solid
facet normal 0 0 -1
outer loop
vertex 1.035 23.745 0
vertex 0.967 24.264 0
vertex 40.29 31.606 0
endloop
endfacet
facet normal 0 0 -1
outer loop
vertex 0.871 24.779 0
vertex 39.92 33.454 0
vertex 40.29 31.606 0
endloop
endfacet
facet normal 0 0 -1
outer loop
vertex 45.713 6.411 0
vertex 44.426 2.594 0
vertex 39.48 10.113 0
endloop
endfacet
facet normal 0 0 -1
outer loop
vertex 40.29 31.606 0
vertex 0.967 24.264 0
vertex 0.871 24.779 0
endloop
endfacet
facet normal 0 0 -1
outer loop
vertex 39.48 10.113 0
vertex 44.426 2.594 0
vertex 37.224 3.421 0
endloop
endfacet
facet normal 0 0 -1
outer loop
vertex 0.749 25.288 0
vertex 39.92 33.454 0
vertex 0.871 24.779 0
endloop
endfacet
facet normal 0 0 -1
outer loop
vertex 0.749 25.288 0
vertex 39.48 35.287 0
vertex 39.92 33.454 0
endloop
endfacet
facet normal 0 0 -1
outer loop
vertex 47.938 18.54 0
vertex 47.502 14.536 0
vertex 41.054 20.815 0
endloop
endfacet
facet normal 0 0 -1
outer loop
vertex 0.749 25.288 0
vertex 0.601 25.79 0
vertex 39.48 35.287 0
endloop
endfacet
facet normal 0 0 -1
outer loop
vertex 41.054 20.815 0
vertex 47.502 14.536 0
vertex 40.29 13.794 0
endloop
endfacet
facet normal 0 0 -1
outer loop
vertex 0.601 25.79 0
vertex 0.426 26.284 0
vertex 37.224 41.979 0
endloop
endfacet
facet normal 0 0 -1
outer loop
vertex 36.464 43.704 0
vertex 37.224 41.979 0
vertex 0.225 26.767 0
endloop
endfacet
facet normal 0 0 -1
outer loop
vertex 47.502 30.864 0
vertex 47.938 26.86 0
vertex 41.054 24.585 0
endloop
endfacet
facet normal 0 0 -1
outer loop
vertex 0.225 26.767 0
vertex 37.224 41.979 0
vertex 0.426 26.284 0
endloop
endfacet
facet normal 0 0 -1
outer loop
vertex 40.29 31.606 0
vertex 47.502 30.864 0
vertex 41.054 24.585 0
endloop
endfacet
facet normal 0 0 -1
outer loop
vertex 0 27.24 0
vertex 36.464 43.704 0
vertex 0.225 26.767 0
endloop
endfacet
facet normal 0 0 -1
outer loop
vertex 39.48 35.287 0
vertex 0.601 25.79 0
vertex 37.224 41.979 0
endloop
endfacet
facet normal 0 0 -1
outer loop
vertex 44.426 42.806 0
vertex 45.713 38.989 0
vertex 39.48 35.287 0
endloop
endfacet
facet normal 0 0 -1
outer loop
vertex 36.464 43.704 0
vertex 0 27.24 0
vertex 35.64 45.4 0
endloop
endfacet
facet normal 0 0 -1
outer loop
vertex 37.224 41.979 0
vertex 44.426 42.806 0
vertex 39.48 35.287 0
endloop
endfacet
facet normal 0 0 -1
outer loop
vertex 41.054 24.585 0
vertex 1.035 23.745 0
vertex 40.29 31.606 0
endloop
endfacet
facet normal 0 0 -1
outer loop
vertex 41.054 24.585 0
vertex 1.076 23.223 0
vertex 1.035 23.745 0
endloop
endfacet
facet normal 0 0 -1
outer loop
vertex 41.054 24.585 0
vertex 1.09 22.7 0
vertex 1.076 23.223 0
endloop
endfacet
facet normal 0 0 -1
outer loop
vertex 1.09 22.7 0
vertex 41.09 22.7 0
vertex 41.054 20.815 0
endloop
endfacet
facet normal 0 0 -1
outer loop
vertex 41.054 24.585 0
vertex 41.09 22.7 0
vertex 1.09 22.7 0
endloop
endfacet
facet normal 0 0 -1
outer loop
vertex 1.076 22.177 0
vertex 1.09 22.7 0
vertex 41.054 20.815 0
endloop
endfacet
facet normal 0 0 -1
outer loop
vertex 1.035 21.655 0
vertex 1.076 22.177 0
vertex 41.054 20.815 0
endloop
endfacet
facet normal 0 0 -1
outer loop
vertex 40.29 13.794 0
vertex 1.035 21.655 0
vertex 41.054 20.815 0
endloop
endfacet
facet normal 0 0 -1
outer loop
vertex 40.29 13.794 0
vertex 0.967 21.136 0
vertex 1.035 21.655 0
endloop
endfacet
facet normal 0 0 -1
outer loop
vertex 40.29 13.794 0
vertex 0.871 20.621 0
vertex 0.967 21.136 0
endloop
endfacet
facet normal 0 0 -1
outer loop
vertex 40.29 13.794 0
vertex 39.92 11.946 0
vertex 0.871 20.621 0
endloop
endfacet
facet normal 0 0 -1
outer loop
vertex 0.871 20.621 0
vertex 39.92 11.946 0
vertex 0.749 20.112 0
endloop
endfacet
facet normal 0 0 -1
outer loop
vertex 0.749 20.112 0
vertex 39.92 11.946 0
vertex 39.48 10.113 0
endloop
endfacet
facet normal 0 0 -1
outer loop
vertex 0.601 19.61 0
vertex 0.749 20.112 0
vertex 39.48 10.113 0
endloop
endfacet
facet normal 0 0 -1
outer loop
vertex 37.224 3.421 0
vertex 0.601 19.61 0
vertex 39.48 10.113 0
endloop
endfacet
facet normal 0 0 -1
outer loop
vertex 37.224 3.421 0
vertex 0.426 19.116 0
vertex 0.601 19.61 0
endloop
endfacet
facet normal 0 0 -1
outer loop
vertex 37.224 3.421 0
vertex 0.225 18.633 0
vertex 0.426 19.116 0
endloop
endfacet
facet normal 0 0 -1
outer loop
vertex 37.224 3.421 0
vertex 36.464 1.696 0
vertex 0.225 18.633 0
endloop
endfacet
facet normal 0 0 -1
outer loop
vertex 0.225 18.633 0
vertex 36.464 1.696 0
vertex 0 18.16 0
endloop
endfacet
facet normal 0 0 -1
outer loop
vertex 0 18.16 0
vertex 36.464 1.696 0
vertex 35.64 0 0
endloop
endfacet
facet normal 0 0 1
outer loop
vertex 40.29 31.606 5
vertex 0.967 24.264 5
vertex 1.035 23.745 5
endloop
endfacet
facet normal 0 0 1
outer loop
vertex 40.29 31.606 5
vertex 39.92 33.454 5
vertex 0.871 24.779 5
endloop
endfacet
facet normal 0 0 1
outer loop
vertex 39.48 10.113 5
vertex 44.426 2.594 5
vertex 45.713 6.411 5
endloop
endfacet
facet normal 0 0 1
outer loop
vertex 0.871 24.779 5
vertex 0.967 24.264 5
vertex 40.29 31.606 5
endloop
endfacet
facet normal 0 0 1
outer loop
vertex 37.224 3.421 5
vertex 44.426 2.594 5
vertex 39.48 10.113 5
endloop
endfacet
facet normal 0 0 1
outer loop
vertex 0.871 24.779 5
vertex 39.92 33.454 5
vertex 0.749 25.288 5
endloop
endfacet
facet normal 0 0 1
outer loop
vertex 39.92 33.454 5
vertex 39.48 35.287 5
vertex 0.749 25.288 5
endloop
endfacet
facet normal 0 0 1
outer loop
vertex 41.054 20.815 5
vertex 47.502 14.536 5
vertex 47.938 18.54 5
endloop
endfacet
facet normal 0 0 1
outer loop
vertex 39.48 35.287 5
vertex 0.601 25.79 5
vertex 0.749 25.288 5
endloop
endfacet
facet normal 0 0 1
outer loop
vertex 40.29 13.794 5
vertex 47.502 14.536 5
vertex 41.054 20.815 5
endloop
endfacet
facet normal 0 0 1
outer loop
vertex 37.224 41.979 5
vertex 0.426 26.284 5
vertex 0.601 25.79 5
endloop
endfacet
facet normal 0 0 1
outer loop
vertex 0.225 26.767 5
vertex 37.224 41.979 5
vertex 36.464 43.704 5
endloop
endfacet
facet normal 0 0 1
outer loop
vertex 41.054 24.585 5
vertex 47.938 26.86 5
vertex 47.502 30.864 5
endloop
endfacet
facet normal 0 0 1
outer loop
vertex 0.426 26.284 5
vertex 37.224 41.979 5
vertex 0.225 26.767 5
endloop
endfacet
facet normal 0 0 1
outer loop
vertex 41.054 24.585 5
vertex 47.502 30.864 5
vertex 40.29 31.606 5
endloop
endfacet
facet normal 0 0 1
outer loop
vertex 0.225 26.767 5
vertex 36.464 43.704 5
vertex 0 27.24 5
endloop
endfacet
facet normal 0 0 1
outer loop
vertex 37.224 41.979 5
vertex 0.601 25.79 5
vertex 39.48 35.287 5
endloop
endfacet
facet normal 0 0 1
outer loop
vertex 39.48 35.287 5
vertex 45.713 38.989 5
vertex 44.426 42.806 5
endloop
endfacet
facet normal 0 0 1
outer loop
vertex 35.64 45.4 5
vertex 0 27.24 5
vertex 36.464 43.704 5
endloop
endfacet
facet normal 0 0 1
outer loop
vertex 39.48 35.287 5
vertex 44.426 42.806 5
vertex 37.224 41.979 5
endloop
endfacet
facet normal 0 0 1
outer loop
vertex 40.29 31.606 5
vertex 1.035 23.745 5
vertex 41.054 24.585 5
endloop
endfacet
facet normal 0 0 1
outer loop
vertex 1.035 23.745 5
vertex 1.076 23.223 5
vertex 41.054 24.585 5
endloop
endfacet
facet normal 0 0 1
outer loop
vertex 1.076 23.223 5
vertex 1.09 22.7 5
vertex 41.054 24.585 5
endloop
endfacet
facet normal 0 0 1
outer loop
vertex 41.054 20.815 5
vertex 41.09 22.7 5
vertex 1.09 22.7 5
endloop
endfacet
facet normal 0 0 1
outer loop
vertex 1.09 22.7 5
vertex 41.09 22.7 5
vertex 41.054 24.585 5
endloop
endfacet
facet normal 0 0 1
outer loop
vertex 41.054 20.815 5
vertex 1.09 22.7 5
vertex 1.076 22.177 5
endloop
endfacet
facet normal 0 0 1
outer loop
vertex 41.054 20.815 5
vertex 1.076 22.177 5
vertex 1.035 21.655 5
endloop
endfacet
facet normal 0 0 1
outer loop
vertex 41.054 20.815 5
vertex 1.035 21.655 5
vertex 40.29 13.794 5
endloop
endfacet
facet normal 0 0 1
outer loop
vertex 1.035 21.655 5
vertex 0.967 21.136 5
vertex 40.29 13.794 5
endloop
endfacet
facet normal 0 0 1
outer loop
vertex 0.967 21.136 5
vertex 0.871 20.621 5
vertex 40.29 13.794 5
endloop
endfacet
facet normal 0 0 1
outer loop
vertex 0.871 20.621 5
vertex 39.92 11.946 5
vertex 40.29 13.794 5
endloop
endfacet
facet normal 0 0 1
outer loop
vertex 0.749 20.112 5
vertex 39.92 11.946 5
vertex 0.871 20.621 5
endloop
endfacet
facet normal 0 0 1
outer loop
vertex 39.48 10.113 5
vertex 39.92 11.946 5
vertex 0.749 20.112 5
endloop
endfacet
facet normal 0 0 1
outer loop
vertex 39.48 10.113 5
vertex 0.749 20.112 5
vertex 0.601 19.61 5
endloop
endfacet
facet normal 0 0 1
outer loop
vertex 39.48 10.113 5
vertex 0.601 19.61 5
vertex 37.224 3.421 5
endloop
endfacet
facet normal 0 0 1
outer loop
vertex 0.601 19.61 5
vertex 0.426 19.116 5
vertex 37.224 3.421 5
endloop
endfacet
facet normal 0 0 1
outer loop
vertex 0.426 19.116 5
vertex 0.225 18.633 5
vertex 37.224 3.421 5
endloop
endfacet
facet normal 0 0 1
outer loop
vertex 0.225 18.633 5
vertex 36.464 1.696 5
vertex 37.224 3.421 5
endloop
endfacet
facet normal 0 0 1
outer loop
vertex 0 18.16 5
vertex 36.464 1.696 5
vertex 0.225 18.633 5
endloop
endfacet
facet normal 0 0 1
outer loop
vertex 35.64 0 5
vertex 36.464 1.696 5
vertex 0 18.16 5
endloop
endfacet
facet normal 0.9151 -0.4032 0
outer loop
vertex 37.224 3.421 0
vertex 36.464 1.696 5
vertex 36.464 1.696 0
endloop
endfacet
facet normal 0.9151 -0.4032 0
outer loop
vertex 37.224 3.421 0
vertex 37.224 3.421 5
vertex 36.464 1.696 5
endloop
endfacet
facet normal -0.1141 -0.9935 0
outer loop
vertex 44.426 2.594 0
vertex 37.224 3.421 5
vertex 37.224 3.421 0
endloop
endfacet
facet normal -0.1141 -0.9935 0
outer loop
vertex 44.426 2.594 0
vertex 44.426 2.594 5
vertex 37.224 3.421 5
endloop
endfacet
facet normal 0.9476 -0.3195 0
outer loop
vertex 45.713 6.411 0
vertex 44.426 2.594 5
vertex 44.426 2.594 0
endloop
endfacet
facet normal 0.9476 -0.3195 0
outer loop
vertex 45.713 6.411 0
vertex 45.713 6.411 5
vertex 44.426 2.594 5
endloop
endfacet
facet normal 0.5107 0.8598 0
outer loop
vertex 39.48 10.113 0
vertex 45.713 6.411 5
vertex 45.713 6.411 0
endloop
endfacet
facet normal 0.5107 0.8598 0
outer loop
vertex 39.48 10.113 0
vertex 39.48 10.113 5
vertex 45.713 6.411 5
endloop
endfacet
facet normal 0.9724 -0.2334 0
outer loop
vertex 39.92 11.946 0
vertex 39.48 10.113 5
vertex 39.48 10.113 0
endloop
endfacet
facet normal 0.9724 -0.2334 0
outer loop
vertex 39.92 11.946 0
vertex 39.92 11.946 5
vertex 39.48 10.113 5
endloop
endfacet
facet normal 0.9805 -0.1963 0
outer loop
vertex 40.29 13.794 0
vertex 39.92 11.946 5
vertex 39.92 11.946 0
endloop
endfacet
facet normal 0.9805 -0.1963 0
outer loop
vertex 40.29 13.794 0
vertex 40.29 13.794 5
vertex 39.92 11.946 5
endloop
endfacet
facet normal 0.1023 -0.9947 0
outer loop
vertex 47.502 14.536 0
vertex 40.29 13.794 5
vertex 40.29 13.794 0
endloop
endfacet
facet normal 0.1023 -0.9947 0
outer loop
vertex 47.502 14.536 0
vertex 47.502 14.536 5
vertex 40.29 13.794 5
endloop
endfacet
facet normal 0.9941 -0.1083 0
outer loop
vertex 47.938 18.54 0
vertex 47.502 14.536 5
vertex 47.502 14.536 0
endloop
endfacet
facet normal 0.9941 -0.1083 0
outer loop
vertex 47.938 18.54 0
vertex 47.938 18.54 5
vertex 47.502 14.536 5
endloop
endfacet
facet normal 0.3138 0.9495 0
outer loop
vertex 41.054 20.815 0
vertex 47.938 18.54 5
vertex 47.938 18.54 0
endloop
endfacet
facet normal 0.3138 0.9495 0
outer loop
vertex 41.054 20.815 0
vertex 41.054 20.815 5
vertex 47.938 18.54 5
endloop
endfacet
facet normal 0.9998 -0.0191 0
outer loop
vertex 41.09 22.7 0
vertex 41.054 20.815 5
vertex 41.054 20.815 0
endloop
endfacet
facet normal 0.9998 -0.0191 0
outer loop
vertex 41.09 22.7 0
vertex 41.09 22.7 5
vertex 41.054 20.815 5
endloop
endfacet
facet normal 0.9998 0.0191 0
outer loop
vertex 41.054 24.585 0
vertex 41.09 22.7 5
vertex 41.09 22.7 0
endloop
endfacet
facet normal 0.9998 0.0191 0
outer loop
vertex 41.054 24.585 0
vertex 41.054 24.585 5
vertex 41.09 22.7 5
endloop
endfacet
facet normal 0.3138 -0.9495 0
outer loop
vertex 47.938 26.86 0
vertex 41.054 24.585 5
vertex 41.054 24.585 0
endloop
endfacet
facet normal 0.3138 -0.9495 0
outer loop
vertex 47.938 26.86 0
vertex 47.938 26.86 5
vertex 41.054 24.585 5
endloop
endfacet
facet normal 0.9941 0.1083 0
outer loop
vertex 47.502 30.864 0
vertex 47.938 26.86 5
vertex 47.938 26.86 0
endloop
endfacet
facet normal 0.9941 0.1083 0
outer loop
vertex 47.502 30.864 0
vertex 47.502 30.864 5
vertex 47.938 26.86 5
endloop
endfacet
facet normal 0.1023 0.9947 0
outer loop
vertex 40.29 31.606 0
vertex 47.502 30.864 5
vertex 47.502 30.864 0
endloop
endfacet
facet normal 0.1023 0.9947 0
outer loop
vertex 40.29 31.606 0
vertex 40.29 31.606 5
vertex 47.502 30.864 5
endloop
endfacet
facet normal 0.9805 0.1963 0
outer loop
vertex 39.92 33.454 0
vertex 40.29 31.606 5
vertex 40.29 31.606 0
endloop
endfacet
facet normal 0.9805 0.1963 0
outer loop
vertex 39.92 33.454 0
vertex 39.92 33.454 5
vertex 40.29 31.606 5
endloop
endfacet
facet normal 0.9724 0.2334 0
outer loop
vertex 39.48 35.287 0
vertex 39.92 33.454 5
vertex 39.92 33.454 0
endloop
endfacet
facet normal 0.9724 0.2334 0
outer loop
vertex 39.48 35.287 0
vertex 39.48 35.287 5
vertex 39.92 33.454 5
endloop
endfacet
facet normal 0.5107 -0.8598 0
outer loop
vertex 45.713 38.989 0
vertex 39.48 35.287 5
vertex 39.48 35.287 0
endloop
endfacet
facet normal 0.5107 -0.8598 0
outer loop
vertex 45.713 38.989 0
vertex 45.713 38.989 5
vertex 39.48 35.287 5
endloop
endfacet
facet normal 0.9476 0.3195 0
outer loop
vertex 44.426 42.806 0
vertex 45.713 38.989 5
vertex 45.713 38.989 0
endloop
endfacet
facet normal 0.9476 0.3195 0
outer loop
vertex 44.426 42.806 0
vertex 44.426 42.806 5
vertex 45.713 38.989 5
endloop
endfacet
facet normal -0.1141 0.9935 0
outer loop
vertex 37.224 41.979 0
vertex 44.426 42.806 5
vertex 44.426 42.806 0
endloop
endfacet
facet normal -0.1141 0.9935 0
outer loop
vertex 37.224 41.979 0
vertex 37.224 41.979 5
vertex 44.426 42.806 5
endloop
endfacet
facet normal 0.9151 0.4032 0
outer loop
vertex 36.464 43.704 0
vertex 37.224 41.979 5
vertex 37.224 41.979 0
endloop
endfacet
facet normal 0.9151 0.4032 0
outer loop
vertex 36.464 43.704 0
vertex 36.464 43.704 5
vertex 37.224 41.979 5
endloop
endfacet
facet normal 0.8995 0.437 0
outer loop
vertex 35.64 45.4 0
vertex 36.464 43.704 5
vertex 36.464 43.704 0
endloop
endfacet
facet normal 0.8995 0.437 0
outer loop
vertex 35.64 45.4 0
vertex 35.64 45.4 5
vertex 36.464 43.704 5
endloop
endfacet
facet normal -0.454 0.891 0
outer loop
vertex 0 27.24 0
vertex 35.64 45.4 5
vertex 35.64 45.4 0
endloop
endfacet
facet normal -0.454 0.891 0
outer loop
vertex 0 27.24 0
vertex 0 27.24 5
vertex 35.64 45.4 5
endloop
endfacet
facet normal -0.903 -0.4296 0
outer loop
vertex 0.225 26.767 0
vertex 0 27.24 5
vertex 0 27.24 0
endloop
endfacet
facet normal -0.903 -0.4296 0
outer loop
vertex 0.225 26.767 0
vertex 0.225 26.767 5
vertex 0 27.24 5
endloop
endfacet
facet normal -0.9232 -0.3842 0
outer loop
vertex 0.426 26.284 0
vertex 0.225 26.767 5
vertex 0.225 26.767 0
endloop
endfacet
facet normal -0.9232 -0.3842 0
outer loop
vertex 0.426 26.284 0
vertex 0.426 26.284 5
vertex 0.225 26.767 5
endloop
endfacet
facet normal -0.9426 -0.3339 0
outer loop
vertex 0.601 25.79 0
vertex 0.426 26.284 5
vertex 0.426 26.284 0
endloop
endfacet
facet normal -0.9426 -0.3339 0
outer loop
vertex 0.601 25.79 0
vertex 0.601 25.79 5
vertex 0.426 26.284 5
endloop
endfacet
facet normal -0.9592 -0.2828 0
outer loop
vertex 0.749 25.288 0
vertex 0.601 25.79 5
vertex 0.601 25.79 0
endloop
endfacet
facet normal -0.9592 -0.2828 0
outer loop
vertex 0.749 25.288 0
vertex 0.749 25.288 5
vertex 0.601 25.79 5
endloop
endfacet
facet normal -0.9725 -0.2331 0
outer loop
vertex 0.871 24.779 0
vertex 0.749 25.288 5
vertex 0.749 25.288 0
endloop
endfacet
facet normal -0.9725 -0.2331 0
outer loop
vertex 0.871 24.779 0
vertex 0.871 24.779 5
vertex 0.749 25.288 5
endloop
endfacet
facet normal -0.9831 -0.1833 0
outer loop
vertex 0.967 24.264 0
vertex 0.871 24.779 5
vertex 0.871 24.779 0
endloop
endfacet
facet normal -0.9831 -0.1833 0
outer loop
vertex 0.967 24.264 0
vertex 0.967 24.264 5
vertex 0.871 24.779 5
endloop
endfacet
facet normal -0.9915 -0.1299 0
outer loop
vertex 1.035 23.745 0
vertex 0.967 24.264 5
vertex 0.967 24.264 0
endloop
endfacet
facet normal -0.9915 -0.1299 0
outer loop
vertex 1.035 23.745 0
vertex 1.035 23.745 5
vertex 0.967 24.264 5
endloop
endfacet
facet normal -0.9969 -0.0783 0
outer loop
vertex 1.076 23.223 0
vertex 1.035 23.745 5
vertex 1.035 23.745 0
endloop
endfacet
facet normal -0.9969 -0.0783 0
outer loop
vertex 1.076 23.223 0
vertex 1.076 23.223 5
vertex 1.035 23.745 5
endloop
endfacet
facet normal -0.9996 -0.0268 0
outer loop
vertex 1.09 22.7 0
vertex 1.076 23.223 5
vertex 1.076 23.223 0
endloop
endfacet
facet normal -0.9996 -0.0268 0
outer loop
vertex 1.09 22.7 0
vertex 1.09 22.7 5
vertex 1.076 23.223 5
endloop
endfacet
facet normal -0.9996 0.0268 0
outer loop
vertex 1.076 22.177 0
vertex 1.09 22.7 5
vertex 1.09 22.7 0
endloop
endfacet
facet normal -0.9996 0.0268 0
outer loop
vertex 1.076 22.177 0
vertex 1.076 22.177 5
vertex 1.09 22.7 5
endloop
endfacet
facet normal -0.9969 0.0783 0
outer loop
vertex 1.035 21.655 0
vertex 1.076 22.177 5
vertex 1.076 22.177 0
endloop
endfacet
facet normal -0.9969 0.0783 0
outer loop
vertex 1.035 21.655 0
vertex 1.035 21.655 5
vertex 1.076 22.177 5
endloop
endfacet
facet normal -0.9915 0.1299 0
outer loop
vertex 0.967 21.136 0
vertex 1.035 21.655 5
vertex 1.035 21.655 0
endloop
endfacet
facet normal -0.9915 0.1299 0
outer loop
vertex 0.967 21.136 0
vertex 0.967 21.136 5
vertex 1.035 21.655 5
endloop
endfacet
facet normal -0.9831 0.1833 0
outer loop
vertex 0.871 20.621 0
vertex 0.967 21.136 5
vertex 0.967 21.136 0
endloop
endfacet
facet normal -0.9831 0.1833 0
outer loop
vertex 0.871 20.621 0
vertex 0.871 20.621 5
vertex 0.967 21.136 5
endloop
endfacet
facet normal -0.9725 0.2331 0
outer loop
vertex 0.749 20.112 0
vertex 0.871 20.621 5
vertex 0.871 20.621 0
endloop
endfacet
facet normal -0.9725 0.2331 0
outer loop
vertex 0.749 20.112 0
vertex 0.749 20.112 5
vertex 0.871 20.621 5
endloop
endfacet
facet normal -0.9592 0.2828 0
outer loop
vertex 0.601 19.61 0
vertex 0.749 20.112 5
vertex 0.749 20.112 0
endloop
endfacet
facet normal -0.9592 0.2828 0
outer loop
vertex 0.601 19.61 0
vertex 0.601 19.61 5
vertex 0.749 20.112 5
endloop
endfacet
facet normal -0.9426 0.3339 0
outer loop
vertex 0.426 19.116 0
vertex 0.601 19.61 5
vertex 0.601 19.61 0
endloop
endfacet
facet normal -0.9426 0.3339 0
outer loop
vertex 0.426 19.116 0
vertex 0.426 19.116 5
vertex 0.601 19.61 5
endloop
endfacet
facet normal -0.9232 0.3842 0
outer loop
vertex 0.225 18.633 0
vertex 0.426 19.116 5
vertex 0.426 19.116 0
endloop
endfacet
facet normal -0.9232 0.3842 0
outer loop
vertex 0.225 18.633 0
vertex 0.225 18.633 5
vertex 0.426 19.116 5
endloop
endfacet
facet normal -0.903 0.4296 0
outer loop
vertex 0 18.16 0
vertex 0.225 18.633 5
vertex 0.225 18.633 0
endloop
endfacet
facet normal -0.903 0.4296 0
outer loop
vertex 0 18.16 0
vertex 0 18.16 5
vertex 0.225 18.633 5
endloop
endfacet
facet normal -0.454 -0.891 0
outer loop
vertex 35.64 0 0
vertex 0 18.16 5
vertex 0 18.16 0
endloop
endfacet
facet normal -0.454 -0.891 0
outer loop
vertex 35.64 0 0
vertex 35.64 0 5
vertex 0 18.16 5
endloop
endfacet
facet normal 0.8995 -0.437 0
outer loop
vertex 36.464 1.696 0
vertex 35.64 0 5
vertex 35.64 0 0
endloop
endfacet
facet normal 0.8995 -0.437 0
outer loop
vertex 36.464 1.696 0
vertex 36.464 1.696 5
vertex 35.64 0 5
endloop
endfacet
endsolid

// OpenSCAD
$fn = 32;

// ----------------------------------------------------------------------
// Gear sector: 4 teeth on 54 degrees
// ----------------------------------------------------------------------

// --- parameters (mm) ---
sector_angle = 54;        // sector angle, degrees
root_r = 50;              // root circle radius
tooth_h = 7;              // tooth height over the root circle
teeth = 4;                // number of teeth on the sector
hub_r = 10;               // hub bore radius
plate_t = 5;              // sector thickness, Z
arc_step = 3;             // sampling step of the root/hub arcs, degrees

tip_r = root_r + tooth_h;  // tip circle radius

profile = [[35.64, 0], [36.464, 1.696], [37.224, 3.421], [44.426, 2.594], [45.713, 6.411], [39.48, 10.113], [39.92, 11.946], [40.29, 13.794], [47.502, 14.536], [47.938, 18.54], [41.054, 20.815], [41.09, 22.7], [41.054, 24.585], [47.938, 26.86], [47.502, 30.864], [40.29, 31.606], [39.92, 33.454], [39.48, 35.287], [45.713, 38.989], [44.426, 42.806], [37.224, 41.979], [36.464, 43.704], [35.64, 45.4], [0, 27.24], [0.225, 26.767], [0.426, 26.284], [0.601, 25.79], [0.749, 25.288], [0.871, 24.779], [0.967, 24.264], [1.035, 23.745], [1.076, 23.223], [1.09, 22.7], [1.076, 22.177], [1.035, 21.655], [0.967, 21.136], [0.871, 20.621], [0.749, 20.112], [0.601, 19.61], [0.426, 19.116], [0.225, 18.633], [0, 18.16]];  // primary outline, 42 points, counter clockwise

// --- the one profile operation ---
linear_extrude(height = plate_t) polygon(points = profile);
